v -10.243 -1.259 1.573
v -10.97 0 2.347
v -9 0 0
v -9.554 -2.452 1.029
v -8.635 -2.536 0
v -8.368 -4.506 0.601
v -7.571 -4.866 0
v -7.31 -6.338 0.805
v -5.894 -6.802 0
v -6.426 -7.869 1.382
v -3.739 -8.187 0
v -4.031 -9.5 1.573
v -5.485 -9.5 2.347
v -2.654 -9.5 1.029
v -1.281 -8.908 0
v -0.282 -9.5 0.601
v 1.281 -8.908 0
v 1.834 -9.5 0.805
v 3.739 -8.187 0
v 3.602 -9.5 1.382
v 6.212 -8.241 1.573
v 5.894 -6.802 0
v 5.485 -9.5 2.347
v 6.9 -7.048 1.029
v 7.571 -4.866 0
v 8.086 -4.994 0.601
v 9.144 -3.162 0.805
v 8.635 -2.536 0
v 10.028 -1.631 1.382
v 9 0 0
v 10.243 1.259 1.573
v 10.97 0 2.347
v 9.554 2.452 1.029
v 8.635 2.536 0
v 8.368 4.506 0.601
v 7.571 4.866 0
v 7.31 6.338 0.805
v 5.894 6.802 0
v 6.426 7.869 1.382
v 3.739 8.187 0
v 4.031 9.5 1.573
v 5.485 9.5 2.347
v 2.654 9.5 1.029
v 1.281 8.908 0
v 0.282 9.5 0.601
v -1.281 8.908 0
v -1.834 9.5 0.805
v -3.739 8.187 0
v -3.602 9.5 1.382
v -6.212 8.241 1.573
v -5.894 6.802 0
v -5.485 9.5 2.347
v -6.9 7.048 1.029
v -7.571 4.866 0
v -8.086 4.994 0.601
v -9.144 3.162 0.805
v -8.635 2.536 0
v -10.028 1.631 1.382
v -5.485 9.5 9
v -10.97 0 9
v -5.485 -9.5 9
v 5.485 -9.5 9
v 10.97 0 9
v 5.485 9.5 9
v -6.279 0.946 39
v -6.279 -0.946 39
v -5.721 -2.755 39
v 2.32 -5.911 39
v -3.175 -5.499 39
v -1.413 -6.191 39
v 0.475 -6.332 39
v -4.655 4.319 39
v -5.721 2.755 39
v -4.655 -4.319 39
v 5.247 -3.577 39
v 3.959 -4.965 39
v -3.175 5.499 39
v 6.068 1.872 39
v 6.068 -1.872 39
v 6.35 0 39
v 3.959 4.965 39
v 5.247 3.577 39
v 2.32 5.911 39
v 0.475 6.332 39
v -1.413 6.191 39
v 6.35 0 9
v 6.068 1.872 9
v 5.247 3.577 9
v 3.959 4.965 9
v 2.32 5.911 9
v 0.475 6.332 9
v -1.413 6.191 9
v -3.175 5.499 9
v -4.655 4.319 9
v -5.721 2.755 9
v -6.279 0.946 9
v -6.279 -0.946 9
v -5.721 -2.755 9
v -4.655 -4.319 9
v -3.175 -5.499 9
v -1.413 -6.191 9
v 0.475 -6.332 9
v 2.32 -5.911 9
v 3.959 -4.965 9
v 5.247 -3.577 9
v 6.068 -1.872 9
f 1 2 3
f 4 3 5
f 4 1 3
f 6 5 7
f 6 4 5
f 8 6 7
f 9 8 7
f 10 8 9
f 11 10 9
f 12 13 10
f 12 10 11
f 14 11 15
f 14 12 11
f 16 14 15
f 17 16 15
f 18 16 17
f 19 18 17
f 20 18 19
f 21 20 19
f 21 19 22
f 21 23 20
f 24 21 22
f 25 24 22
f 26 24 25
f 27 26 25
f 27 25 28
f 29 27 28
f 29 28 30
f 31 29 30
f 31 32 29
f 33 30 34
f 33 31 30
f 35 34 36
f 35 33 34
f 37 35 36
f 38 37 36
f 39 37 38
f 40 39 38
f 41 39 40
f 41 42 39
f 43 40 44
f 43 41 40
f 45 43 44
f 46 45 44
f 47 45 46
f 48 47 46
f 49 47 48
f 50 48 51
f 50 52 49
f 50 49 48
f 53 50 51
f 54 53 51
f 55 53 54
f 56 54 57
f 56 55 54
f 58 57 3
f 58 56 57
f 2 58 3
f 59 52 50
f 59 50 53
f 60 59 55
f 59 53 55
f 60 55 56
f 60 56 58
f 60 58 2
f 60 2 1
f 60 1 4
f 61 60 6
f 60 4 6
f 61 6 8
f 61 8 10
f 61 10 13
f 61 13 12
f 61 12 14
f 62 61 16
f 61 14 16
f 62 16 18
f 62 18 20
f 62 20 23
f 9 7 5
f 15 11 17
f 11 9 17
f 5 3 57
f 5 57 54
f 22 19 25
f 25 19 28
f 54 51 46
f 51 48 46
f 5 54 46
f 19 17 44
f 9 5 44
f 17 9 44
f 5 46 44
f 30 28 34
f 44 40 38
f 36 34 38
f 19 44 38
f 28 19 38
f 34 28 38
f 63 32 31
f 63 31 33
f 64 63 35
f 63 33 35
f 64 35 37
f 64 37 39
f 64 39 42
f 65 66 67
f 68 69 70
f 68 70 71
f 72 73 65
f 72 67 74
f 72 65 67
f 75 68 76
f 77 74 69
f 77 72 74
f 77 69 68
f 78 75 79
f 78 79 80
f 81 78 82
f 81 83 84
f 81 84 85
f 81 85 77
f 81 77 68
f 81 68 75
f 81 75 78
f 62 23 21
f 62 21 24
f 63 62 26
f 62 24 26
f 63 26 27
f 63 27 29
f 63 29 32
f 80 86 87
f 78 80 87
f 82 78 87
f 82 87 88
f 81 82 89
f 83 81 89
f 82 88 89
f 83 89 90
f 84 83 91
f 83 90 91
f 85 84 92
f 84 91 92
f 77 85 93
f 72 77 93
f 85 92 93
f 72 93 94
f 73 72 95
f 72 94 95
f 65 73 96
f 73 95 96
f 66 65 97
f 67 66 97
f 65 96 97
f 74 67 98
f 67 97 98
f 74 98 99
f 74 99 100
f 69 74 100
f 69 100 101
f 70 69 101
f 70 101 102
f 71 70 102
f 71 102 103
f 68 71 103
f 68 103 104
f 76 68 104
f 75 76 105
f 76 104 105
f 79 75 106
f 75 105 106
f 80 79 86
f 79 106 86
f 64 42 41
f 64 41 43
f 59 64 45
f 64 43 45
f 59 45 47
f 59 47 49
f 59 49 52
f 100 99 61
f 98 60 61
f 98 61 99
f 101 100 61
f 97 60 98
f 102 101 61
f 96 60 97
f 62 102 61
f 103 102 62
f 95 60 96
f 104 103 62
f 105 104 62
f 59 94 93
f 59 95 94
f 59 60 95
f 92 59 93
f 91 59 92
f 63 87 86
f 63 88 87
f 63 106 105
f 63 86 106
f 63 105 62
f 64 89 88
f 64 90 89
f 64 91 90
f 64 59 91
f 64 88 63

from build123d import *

# Parameters (mm, degrees)
SALIENTE_EXTRUIR1_DEPTH = 9
CROQUIS2_R              = 6.35
SALIENTE_EXTRUIR2_DEPTH = 30
CROQUIS3_R              = 18.81463578
CROQUIS3_R_2            = 9
CORTAR_EXTRUIR1_DEPTH   = 10
CORTAR_EXTRUIR1_TAPER   = 40


with BuildPart() as part:
    # Croquis1 → Saliente-Extruir1 (new body)
    with BuildSketch(Plane.XY):
        Polygon((10.969655115, 0), (5.484827557, 9.5), (-5.484827557, 9.5), (-10.969655115, 0), (-5.484827557, -9.5), (5.484827557, -9.5), align=None)
    extrude(amount=SALIENTE_EXTRUIR1_DEPTH)

    # Croquis2 → Saliente-Extruir2 (add)
    with BuildSketch(Plane.XY.offset(9)):
        Circle(CROQUIS2_R)
    extrude(amount=SALIENTE_EXTRUIR2_DEPTH)

    # Croquis3 → Cortar-Extruir1 (cut)
    with BuildSketch(Plane(origin=(0, 0, 0), x_dir=(-1, 0, 0), z_dir=(0, 0, -1))):
        Circle(CROQUIS3_R)
        Circle(CROQUIS3_R_2, mode=Mode.SUBTRACT)
    extrude(amount=-CORTAR_EXTRUIR1_DEPTH, taper=CORTAR_EXTRUIR1_TAPER, mode=Mode.SUBTRACT)


solid = part.part
